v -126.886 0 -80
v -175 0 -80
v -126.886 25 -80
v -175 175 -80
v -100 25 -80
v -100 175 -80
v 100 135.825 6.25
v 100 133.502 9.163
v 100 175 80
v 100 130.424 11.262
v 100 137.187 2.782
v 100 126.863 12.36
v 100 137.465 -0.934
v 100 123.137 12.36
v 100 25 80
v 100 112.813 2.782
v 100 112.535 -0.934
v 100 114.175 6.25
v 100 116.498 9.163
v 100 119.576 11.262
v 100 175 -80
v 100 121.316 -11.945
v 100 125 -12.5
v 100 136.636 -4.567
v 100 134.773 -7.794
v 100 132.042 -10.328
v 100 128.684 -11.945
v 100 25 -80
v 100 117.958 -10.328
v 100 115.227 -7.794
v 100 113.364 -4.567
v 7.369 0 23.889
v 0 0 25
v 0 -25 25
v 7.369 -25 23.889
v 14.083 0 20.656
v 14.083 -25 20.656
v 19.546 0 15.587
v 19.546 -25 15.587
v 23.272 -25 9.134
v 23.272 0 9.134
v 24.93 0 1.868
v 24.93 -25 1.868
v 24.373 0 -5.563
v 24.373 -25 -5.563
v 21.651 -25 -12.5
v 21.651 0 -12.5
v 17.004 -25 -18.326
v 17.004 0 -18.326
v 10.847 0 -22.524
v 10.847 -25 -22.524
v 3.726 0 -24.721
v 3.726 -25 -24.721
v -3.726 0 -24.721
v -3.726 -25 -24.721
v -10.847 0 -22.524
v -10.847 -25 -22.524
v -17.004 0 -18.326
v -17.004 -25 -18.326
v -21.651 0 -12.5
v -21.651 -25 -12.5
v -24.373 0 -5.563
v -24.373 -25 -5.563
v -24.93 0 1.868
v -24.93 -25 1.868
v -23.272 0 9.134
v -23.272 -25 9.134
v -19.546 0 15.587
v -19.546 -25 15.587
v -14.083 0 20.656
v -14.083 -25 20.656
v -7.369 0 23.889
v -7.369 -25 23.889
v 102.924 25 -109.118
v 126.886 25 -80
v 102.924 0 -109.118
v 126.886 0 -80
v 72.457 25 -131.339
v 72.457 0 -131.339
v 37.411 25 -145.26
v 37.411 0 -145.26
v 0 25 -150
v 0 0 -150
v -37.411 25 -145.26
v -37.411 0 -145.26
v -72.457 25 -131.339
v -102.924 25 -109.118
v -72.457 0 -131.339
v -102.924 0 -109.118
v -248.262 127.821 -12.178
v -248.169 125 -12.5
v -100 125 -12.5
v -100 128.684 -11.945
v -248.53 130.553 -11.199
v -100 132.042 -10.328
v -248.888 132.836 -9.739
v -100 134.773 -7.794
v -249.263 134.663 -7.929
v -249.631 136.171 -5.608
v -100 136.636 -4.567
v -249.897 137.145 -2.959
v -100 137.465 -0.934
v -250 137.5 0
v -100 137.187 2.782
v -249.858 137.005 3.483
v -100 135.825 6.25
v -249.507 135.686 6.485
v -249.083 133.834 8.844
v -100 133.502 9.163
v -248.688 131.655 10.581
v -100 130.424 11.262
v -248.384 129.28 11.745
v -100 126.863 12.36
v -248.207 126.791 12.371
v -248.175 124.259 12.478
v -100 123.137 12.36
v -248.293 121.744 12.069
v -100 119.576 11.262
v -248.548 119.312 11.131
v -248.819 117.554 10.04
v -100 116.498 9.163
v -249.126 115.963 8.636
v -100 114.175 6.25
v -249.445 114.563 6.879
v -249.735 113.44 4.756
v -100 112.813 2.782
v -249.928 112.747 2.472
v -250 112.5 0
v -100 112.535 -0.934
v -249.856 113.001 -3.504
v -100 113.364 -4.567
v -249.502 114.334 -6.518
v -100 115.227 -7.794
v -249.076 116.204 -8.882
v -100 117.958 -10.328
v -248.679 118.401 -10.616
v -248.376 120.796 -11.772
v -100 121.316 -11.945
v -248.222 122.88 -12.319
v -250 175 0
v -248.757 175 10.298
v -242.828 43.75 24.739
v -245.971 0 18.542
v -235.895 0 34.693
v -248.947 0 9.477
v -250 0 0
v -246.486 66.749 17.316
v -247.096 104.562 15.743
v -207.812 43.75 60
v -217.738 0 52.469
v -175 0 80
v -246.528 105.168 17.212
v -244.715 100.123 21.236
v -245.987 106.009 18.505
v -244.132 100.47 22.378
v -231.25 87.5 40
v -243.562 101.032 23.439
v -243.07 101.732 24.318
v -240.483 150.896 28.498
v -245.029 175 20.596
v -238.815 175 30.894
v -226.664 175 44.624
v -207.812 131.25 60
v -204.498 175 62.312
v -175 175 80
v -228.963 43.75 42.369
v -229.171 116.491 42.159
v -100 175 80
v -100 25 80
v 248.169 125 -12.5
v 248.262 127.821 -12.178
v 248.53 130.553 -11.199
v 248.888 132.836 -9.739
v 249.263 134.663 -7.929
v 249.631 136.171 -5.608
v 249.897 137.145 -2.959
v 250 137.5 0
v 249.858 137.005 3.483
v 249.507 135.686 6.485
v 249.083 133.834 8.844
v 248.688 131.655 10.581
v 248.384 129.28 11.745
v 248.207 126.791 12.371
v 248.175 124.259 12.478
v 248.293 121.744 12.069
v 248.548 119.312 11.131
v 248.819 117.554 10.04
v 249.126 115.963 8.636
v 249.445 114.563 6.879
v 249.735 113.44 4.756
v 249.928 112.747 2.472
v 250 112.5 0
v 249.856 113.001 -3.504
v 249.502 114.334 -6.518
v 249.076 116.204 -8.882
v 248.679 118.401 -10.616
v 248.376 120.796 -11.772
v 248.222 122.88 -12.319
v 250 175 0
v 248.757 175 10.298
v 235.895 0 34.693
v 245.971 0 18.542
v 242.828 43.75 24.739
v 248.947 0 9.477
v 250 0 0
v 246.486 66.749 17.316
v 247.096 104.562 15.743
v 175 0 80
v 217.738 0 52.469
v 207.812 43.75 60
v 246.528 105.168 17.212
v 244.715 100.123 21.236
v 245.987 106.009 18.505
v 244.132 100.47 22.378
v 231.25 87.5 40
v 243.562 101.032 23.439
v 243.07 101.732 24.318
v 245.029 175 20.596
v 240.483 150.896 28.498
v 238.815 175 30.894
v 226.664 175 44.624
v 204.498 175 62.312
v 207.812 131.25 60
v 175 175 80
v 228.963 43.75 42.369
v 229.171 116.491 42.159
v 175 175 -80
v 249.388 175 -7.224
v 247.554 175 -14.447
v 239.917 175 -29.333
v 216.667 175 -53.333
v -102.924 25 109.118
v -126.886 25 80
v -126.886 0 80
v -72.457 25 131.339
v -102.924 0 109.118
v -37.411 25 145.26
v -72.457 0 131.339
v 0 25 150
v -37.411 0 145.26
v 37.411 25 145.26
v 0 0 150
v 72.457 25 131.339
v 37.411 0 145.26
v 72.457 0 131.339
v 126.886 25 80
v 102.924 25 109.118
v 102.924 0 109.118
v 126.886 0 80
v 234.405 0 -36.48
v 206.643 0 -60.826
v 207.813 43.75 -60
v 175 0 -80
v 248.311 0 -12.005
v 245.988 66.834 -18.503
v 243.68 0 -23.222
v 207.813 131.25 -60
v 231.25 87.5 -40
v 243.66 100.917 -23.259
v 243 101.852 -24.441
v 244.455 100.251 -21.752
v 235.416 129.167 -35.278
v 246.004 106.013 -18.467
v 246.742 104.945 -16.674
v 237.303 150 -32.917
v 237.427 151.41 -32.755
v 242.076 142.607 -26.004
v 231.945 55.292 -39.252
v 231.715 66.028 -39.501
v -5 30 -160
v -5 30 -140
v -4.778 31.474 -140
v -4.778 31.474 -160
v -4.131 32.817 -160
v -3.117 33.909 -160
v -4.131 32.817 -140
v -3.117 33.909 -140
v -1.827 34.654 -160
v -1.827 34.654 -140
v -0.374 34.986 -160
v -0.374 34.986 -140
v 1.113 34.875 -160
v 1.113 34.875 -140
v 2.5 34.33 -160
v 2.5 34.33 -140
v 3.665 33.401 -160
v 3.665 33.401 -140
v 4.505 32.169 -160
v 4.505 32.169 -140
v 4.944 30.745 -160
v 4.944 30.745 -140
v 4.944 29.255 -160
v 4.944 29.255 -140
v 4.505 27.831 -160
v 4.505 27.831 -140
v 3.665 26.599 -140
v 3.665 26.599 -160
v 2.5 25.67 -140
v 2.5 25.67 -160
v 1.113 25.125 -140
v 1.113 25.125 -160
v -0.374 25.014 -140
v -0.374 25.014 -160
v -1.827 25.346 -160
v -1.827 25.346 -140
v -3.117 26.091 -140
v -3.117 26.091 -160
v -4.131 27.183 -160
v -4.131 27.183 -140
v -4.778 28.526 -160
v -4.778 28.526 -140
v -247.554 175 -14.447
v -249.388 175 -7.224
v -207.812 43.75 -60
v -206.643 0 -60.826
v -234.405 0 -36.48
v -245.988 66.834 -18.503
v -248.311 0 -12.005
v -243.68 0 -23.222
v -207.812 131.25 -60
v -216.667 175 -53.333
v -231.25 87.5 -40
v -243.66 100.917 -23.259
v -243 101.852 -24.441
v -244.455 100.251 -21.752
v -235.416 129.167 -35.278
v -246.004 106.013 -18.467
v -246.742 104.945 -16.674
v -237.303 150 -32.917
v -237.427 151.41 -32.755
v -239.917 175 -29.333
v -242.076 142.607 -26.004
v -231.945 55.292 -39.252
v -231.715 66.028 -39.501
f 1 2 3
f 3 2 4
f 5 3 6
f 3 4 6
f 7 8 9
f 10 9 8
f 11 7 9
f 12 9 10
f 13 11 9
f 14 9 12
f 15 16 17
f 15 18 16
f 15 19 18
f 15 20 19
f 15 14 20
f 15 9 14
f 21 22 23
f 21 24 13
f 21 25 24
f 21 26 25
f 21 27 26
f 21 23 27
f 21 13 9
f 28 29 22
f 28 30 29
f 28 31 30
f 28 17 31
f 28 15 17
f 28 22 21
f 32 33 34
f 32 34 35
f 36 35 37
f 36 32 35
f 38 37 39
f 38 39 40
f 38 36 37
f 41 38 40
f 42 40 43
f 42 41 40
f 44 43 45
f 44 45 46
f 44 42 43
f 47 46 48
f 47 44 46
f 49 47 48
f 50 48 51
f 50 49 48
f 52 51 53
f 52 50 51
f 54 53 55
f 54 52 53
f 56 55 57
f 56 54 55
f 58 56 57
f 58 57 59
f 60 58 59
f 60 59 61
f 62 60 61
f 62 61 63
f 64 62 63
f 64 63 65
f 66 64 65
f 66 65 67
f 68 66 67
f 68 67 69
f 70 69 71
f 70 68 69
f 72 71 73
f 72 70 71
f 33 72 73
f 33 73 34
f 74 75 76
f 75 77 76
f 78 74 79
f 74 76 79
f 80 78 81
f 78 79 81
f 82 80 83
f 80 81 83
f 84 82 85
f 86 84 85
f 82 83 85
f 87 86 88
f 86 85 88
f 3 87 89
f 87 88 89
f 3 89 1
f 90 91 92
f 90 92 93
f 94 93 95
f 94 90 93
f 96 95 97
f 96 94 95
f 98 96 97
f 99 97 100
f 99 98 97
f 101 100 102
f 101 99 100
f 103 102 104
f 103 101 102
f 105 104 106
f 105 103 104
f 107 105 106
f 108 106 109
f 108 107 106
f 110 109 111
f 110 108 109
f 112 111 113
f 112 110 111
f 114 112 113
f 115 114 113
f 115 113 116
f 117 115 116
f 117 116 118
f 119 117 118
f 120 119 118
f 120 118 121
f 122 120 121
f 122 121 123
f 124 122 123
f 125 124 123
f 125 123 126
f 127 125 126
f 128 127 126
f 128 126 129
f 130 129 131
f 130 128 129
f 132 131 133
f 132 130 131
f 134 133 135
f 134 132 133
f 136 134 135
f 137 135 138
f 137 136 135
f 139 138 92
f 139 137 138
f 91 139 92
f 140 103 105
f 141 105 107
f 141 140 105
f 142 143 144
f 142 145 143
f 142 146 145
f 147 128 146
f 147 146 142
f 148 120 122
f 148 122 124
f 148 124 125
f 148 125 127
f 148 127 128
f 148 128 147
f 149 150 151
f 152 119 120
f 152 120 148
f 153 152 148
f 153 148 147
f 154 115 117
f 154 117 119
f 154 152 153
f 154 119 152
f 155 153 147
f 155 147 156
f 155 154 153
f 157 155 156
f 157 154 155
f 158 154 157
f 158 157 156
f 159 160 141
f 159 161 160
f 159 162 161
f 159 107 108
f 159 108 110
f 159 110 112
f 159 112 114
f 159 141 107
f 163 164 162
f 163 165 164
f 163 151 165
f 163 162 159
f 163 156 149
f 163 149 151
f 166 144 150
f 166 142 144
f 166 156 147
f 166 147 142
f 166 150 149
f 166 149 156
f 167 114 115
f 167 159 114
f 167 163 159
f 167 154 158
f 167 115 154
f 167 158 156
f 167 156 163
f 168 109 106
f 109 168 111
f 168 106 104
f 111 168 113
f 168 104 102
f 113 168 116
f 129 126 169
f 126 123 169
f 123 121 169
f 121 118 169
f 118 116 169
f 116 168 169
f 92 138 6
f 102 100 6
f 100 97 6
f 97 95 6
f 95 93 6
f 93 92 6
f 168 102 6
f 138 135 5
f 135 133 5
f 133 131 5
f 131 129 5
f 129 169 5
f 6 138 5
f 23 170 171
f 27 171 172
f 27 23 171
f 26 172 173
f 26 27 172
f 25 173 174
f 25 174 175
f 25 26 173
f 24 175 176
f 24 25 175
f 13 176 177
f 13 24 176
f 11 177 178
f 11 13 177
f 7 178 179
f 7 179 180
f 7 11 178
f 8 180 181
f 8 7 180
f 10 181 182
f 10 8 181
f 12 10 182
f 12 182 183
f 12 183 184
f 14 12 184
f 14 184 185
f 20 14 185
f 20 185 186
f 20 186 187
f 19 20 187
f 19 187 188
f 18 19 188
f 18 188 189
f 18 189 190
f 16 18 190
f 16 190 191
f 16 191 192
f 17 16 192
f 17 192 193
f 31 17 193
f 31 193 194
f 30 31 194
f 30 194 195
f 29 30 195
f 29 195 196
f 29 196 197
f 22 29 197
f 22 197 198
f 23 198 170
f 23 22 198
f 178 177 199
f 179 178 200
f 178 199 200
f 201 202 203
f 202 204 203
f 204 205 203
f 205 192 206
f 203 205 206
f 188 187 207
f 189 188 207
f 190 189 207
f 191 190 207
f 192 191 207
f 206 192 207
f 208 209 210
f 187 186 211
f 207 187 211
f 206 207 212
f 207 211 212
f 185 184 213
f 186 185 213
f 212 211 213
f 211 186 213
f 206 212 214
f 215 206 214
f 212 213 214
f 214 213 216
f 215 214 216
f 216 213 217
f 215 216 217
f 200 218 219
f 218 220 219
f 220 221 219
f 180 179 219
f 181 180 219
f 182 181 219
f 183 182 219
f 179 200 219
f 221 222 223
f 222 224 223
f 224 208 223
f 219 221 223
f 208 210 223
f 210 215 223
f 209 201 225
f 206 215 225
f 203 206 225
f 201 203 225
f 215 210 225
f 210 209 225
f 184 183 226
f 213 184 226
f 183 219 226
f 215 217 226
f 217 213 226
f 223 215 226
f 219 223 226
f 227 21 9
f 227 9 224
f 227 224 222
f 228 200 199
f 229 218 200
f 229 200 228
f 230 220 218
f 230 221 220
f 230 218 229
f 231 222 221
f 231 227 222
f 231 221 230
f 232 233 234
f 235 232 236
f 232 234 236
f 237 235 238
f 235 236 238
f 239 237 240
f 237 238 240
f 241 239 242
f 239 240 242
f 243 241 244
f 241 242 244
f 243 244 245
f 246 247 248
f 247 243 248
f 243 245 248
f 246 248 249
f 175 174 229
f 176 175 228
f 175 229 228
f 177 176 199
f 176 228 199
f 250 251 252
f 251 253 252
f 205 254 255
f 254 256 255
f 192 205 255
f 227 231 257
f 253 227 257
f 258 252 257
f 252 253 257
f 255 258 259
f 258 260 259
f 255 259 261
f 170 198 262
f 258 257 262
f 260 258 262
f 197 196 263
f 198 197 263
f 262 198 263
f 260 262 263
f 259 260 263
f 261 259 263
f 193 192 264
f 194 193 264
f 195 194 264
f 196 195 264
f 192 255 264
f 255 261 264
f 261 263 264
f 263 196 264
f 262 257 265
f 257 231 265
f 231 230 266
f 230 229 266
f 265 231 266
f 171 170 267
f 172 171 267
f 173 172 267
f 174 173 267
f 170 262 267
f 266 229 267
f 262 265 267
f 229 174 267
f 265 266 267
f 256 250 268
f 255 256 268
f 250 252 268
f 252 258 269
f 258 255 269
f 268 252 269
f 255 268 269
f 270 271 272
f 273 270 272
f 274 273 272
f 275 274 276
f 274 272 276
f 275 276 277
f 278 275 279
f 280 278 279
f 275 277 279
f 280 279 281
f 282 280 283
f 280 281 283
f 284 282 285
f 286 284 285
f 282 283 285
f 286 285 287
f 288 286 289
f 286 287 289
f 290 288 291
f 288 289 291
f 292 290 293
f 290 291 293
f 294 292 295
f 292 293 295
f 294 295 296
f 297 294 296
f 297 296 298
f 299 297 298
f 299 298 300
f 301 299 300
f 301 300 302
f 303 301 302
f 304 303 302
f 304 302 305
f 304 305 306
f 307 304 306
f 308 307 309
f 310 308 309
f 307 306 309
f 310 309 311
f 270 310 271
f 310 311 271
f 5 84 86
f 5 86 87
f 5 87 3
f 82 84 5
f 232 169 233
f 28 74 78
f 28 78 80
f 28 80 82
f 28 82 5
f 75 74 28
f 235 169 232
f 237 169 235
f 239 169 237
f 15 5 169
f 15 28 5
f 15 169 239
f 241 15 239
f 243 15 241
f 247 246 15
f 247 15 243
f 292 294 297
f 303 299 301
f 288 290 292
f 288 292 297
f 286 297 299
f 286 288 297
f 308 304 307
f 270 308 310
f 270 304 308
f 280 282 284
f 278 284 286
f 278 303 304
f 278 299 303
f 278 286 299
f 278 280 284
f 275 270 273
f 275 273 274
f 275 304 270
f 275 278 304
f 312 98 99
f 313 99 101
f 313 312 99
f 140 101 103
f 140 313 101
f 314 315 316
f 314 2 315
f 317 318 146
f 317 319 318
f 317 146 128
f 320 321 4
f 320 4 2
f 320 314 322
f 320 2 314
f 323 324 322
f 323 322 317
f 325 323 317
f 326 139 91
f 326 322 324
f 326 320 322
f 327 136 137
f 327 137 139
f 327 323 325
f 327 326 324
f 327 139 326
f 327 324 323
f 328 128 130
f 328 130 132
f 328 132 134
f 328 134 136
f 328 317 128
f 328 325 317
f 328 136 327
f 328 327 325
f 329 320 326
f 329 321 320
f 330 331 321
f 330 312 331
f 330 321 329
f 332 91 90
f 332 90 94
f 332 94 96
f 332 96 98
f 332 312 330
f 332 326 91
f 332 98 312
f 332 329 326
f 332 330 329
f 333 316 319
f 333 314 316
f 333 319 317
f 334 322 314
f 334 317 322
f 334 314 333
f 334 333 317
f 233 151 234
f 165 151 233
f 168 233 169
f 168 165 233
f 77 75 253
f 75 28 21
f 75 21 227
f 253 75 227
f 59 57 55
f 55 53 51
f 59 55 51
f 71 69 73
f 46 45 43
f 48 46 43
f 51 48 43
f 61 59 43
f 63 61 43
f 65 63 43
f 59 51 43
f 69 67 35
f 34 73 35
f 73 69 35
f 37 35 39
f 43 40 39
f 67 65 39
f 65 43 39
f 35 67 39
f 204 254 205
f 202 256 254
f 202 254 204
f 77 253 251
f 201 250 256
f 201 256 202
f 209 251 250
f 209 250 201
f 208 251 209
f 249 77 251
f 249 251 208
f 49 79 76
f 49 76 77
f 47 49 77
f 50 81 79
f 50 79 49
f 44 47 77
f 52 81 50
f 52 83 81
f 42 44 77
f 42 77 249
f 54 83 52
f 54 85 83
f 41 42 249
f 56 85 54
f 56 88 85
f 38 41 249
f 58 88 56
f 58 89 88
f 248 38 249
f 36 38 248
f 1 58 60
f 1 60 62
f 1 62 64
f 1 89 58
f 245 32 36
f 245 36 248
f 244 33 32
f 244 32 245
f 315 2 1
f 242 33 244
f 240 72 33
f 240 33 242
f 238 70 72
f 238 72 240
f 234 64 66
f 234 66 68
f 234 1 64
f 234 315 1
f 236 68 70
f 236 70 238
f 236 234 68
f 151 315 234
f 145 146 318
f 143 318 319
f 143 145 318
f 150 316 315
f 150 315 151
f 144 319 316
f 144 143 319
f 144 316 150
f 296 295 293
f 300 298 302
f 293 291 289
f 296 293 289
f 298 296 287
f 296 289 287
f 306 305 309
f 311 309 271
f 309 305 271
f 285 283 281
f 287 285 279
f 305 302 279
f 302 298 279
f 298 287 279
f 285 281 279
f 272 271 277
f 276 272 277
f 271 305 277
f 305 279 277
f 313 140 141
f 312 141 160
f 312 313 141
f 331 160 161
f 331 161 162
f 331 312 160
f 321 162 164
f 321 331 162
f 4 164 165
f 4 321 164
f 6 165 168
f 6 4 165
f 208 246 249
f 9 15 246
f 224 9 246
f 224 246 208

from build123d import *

# Parameters (mm, degrees)
SKETCH1_R                       = 25
BOSS_EXTRUDE1_DEPTH             = 25
SKETCH2_R                       = 150
BOSS_EXTRUDE2_DEPTH             = 25
SKETCH3_W                       = 150
SKETCH3_H                       = 160
BOSS_EXTRUDE3_DEPTH             = 150
BOSS_EXTRUDE3_DIRECTION_2_REACH = 219.945
CUT_EXTRUDE2_DEPTH              = 420.076365356
CUT_EXTRUDE2_DEPTH_BACK         = 420.076365356
SKETCH6_R                       = 12.5
CUT_EXTRUDE3_DEPTH              = 354.553390593
BOSS_EXTRUDE5_DEPTH             = 10
BOSS_EXTRUDE5_DEPTH_BACK        = 10
SKETCH9_R                       = 5


with BuildPart() as part:
    # Sketch1 → Boss-Extrude1 (new body)
    with BuildSketch(Plane(origin=(0, 0, 0), x_dir=(1, 0, 0), z_dir=(0, 1, 0))):
        with Locations(Location((0, 0, 0), (0, 0, 270))):
            Circle(SKETCH1_R)
    extrude(amount=-BOSS_EXTRUDE1_DEPTH)

    # Sketch2 → Boss-Extrude2 (add)
    with BuildSketch(Plane(origin=(0, 0, 0), x_dir=(1, 0, 0), z_dir=(0, 1, 0))):
        with Locations(Location((0, 0, 0), (0, 0, 270))):
            Circle(SKETCH2_R)
    extrude(amount=BOSS_EXTRUDE2_DEPTH)

    # Sketch3 → Boss-Extrude3 (add)
    with BuildSketch(Plane(origin=(0, 25, 0), x_dir=(1, 0, 0), z_dir=(0, 1, 0))):
        with Locations((175, 0)):
            Rectangle(SKETCH3_W, SKETCH3_H)
        with Locations((-175, 0)):
            Rectangle(SKETCH3_W, SKETCH3_H)
    extrude(amount=BOSS_EXTRUDE3_DEPTH)

    # Boss-Extrude3 direction 2: up to this face of the body (flat: up to its plane)
    boss_extrude3_direction_2_end = Plane(part.part.faces().sort_by_distance((0, 0, -145.757359313))[0])
    # Sketch3 → Boss-Extrude3 direction 2 (add, up to the picked face)
    with BuildSketch(Plane(origin=(0, 25, 0), x_dir=(1, 0, 0), z_dir=(0, 1, 0)), mode=Mode.PRIVATE) as boss_extrude3_direction_2_sk1:
        with Locations((175, 0)):
            Rectangle(SKETCH3_W, SKETCH3_H)
    boss_extrude3_direction_2_tool1 = split(extrude(boss_extrude3_direction_2_sk1.sketch, amount=-BOSS_EXTRUDE3_DIRECTION_2_REACH, mode=Mode.PRIVATE), bisect_by=boss_extrude3_direction_2_end, keep=Keep.BOTH, mode=Mode.PRIVATE)
    # Sketch3 → Boss-Extrude3 direction 2 (add, up to the picked face)
    with BuildSketch(Plane(origin=(0, 25, 0), x_dir=(1, 0, 0), z_dir=(0, 1, 0)), mode=Mode.PRIVATE) as boss_extrude3_direction_2_sk2:
        with Locations((-175, 0)):
            Rectangle(SKETCH3_W, SKETCH3_H)
    boss_extrude3_direction_2_tool2 = split(extrude(boss_extrude3_direction_2_sk2.sketch, amount=-BOSS_EXTRUDE3_DIRECTION_2_REACH, mode=Mode.PRIVATE), bisect_by=boss_extrude3_direction_2_end, keep=Keep.BOTH, mode=Mode.PRIVATE)
    add(boss_extrude3_direction_2_tool1.solids().sort_by(Axis((175, 25, 0), (0, -1, 0)))[0])
    add(boss_extrude3_direction_2_tool2.solids().sort_by(Axis((-175, 25, 0), (0, -1, 0)))[0])

    # Sketch6 → Cut-Extrude2 (cut, two sides: drawn at the far end of the back side and taken through both)
    with BuildSketch(Plane(origin=(-100, 0, 0), x_dir=(0, 0, -1), z_dir=(1, 0, 0)).offset(-CUT_EXTRUDE2_DEPTH_BACK)):
        with Locations((0, 125)):
            Circle(SKETCH6_R)
    extrude(amount=CUT_EXTRUDE2_DEPTH + CUT_EXTRUDE2_DEPTH_BACK, mode=Mode.SUBTRACT)

    # Sketch7 → Cut-Extrude3 (cut, through all)
    with BuildSketch(Plane(origin=(0, 175, 0), x_dir=(1, 0, 0), z_dir=(0, 1, 0))):
        with BuildLine():
            Line((-250, -80), (-175, -80))
            add(Edge.make_bspline(
                [(-250, 0), (-250, -40), (-175, -80)],
                knots=[0.5, 0.5, 0.5, 1, 1, 1], degree=2))
            Line((-250, 0), (-250, -80))
        make_face()
        with BuildLine():
            Line((-250, 80), (-250, 0))
            add(Edge.make_bspline(
                [(-175, 80), (-250, 40), (-250, 0)],
                knots=[0, 0, 0, 0.5, 0.5, 0.5], degree=2))
            Line((-175, 80), (-250, 80))
        make_face()
        with BuildLine():
            Line((250, -80), (250, -1.99e-07))
            add(Edge.make_bspline(
                [(250, -1.99e-07), (249.999999813, -40.0000001), (175, -80)],
                knots=[0.500000001, 0.500000001, 0.500000001, 1, 1, 1], degree=2))
            Line((175, -80), (250, -80))
        make_face()
        with BuildLine():
            Line((250, 80), (175, 80))
            add(Edge.make_bspline(
                [(175, 80), (250.000000187, 39.9999999), (250, -1.99e-07)],
                knots=[0, 0, 0, 0.500000001, 0.500000001, 0.500000001], degree=2))
            Line((250, -1.99e-07), (250, 80))
        make_face()
    extrude(amount=-CUT_EXTRUDE3_DEPTH, mode=Mode.SUBTRACT)


with BuildPart() as body_2:
    # Sketch9 → Boss-Extrude5 (new, two sides: drawn at the far end of the back side and taken through both)
    with BuildSketch(Plane(origin=(0, 0, -150), x_dir=(-1, 0, 0), z_dir=(0, 0, -1)).offset(-BOSS_EXTRUDE5_DEPTH_BACK)):
        with Locations((0, 30)):
            Circle(SKETCH9_R)
    extrude(amount=BOSS_EXTRUDE5_DEPTH + BOSS_EXTRUDE5_DEPTH_BACK)


solid = Compound([part.part, body_2.part])
